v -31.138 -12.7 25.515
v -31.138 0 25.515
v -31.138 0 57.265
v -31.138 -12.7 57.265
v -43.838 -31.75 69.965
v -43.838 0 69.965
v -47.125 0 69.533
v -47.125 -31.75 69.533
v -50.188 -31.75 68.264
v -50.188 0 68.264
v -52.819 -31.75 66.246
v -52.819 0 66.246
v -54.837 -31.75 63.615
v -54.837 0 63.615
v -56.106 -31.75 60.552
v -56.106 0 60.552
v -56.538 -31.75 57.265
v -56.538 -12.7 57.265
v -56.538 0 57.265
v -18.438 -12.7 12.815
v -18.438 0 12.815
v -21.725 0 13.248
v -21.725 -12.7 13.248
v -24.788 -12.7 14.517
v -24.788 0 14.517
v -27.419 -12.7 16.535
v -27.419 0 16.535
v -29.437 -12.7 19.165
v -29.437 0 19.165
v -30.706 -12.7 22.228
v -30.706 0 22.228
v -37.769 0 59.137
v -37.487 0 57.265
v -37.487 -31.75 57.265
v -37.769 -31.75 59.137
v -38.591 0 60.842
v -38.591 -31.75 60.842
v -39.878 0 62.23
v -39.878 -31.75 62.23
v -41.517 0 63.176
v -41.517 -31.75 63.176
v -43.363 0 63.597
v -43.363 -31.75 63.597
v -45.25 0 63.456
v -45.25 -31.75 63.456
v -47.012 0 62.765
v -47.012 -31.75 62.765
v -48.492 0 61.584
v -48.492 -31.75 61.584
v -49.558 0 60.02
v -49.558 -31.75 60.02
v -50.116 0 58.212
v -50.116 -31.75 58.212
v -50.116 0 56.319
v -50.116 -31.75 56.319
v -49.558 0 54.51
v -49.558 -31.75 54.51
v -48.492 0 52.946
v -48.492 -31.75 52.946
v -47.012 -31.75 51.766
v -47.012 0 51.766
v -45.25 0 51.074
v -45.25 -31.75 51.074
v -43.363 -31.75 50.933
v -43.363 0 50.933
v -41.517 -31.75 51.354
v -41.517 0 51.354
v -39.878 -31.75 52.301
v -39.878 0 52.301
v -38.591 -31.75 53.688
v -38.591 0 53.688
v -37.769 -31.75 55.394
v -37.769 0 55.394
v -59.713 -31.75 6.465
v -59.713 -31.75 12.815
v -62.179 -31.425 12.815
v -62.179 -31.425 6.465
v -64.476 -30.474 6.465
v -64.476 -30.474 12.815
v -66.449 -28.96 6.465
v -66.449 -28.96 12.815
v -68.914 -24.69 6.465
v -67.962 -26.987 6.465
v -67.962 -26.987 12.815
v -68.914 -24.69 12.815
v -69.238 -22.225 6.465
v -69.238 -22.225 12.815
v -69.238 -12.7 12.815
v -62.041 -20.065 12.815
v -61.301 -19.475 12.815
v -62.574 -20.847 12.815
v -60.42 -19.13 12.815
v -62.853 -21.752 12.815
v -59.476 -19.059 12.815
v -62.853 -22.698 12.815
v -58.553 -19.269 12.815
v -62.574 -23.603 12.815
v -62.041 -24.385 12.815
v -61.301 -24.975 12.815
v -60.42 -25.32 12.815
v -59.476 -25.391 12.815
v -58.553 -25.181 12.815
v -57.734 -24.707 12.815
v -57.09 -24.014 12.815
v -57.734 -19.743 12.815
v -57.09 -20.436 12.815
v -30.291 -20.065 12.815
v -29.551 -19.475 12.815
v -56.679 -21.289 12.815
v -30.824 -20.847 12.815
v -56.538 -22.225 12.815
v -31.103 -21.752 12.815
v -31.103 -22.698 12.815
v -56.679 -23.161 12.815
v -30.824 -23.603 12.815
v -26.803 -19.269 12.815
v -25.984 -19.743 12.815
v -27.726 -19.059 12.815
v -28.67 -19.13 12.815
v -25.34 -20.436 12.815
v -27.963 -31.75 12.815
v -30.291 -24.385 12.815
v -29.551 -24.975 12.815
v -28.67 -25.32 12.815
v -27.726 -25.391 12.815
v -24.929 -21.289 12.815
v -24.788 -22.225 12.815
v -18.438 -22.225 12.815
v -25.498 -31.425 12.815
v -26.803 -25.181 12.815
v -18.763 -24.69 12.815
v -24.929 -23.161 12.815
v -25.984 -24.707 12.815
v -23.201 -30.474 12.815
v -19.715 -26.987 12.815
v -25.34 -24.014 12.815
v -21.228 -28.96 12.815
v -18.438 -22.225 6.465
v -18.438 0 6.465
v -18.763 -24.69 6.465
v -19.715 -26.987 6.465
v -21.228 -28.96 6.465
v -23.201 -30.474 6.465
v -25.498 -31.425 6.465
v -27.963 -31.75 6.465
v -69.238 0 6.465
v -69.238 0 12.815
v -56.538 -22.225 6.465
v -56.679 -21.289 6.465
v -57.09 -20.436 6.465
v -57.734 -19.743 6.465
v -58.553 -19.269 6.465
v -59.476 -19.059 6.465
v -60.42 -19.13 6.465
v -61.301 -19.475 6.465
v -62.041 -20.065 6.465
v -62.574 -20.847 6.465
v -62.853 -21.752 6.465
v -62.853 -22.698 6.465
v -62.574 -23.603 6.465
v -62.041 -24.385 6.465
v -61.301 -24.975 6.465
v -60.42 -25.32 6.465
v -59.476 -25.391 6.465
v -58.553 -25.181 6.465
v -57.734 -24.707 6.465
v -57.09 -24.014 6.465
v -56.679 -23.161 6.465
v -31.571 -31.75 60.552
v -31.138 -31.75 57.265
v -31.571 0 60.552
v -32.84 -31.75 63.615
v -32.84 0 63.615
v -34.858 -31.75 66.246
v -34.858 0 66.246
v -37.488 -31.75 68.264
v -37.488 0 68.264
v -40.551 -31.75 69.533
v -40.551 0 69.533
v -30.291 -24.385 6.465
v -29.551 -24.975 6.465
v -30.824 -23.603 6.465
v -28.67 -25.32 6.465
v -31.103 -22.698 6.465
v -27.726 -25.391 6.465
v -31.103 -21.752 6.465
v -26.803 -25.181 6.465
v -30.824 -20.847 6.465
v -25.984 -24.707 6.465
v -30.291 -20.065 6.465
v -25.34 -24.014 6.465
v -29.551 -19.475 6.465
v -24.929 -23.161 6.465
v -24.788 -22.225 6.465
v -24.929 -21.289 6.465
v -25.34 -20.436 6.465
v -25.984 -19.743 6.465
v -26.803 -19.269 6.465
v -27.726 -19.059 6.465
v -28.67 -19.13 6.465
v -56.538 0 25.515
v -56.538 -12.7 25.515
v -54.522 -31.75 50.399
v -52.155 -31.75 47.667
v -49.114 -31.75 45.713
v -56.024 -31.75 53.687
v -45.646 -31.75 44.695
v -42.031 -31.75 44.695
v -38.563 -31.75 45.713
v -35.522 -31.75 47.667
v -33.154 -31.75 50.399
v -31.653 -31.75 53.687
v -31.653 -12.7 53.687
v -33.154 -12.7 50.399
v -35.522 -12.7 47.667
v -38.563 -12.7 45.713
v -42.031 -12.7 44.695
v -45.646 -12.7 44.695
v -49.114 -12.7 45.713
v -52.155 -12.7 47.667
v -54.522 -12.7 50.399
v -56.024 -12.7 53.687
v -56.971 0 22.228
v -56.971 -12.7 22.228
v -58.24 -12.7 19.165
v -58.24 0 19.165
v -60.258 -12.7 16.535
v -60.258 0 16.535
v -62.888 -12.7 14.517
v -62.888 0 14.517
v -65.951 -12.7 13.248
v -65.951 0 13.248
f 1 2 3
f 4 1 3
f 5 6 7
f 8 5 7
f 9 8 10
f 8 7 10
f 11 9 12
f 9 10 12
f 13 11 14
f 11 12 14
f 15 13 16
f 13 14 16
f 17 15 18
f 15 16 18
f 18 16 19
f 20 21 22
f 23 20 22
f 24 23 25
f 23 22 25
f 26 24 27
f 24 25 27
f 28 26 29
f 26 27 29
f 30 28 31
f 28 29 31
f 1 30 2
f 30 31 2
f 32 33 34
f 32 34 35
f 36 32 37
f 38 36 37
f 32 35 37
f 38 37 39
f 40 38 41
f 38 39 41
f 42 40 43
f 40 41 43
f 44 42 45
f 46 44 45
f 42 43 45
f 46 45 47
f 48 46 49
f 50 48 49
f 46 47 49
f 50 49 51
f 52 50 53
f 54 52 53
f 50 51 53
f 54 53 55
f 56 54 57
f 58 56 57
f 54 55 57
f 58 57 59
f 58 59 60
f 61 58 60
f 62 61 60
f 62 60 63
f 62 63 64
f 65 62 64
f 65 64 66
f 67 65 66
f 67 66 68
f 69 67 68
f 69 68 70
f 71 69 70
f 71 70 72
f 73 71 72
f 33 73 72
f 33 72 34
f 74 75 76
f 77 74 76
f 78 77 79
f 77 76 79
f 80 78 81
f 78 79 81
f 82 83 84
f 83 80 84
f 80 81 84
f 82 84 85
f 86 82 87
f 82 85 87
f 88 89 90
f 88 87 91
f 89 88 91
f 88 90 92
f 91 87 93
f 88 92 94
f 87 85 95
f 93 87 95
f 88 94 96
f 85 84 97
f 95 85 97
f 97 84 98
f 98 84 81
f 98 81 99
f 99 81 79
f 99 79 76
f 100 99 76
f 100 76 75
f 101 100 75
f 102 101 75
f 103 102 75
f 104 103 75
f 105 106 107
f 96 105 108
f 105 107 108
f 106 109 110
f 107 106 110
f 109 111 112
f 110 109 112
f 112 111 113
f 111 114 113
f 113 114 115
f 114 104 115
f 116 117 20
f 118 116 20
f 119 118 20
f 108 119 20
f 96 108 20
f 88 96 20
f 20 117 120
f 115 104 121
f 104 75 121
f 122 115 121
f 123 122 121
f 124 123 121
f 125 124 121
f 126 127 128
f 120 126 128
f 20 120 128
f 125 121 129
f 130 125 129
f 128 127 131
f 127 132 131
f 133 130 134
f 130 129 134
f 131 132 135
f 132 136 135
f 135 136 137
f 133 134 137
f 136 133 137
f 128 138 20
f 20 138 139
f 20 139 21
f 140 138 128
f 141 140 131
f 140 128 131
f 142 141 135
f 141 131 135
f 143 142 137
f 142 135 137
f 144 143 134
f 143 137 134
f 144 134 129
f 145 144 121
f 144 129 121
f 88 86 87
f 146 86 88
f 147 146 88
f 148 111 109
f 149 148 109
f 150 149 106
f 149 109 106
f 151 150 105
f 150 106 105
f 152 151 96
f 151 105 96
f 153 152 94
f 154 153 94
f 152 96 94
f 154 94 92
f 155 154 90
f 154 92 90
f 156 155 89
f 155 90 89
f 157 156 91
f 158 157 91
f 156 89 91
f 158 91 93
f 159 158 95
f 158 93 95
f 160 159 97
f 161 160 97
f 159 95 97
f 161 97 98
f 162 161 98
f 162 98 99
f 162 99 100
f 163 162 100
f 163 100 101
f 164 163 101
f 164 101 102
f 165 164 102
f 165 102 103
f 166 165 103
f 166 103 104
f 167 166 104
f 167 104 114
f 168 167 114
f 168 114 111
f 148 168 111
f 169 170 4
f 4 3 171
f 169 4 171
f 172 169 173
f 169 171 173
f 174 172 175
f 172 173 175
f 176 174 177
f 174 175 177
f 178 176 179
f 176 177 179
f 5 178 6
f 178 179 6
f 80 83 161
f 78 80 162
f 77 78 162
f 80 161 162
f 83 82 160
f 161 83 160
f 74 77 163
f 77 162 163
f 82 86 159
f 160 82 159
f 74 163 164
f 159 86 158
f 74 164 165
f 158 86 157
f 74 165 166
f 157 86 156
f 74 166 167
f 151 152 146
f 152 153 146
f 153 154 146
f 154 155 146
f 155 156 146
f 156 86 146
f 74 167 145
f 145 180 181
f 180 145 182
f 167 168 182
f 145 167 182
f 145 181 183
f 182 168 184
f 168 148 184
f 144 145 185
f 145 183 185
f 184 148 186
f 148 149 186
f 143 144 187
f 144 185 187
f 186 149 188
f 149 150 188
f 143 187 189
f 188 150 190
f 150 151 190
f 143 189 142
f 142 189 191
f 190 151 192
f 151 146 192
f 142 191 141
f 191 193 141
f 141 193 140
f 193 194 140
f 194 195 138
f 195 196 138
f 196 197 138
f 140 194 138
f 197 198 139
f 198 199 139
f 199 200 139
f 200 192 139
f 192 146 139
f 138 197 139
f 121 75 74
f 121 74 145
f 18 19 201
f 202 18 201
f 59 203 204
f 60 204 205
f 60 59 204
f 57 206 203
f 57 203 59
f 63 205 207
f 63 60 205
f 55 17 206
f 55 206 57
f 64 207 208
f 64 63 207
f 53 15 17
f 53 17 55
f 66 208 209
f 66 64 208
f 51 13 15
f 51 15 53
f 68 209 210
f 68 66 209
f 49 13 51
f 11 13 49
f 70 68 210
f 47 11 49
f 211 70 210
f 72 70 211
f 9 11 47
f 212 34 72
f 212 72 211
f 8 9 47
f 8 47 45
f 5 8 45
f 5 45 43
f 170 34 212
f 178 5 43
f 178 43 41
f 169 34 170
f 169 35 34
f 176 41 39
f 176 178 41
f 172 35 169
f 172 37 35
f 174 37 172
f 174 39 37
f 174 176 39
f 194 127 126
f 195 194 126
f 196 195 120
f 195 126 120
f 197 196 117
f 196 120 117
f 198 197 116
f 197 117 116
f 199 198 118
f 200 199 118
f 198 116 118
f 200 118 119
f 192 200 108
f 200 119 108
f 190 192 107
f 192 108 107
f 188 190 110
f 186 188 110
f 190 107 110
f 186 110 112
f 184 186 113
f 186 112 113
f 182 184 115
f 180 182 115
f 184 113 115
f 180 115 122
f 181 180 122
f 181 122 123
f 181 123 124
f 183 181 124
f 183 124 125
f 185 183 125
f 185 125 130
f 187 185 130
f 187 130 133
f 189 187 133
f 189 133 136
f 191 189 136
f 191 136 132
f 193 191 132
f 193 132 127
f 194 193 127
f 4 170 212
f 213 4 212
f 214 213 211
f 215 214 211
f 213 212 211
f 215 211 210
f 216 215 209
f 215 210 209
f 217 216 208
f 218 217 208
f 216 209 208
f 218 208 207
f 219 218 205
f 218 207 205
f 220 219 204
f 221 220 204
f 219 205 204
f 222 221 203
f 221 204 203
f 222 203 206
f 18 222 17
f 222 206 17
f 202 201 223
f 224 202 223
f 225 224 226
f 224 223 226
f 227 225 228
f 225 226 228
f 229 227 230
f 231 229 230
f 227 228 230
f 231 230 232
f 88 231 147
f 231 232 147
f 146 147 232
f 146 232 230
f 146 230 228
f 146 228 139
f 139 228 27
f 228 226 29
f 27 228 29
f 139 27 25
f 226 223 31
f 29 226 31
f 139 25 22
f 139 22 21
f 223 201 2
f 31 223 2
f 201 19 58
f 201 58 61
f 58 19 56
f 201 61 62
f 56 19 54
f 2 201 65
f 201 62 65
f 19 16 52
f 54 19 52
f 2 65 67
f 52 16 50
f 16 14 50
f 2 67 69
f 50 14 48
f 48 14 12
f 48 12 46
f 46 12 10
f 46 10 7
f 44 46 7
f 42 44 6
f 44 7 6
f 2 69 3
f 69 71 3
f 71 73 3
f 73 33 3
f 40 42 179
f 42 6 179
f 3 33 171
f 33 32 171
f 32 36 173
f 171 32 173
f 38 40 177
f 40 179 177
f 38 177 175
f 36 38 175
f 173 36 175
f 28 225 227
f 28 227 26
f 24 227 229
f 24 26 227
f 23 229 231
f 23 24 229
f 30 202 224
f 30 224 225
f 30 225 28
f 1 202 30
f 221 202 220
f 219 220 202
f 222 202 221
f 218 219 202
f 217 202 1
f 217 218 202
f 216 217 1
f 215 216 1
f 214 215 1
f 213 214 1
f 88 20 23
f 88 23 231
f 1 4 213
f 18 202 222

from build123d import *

# Parameters (mm, degrees)
F0_W     = 50.8
F0_H     = 63.5
F1_DEPTH = 31.75
F3_DEPTH = 31.751
F5_DEPTH = 19.05
F6_R     = 3.175
F7_DEPTH = 25.4
F8_R     = 6.35
F9_DEPTH = 31.751


with BuildPart() as f1:
    # F0 (on Front) → F1 (new body)
    with BuildSketch(Plane.XZ):
        with Locations((-43.838402, 38.215244)):
            Rectangle(F0_W, F0_H)
    extrude(amount=F1_DEPTH)

    # F2 (on face) → F3 (cut, through all)
    with BuildSketch(Plane(origin=(0, 0, 0), x_dir=(-1, 0, 0), z_dir=(0, 1, 0))):
        with BuildLine():
            Line((18.438402, 69.965244), (18.438402, 12.815244))
            ThreePointArc((18.438402, 12.815244), (27.418658, 16.534988), (31.138402, 25.515244))
            Line((31.138402, 25.515244), (31.138402, 57.265244))
            ThreePointArc((31.138402, 57.265244), (34.858146, 66.2455), (43.838402, 69.965244))
            Line((43.838402, 69.965244), (18.438402, 69.965244))
        make_face()
        with BuildLine():
            ThreePointArc((56.538402, 25.515244), (60.258146, 16.534988), (69.238402, 12.815244))
            Line((69.238402, 12.815244), (69.238402, 69.965244))
            Line((69.238402, 69.965244), (43.838402, 69.965244))
            ThreePointArc((43.838402, 69.965244), (52.818658, 66.2455), (56.538402, 57.265244))
            Line((56.538402, 57.265244), (56.538402, 25.515244))
        make_face()
    extrude(amount=-F3_DEPTH, mode=Mode.SUBTRACT)

    # F4 (on face) → F5 (cut)
    with BuildSketch(Plane.XZ.offset(31.75)):
        with BuildLine():
            ThreePointArc((-56.538402, 25.515244), (-60.258146, 16.534988), (-69.238402, 12.815244))
            Line((-69.238402, 12.815244), (-18.438402, 12.815244))
            ThreePointArc((-18.438402, 12.815244), (-27.418658, 16.534988), (-31.138402, 25.515244))
            Line((-31.138402, 25.515244), (-31.138402, 57.265244))
            ThreePointArc((-31.138402, 57.265244), (-43.838402, 44.565244), (-56.538402, 57.265244))
            Line((-56.538402, 57.265244), (-56.538402, 25.515244))
        make_face()
    extrude(amount=-F5_DEPTH, mode=Mode.SUBTRACT)

    # F6 (on face) → F7 (cut)
    with BuildSketch(Plane.XY.offset(12.815244)):
        with Locations((-27.963402, -22.225)):
            Circle(F6_R)
        with Locations((-59.713402, -22.225)):
            Circle(F6_R)
        with BuildLine():
            Line((-69.238402, -31.75), (-59.713402, -31.75))
            ThreePointArc((-59.713402, -31.75), (-66.448594, -28.960192), (-69.238402, -22.225))
            Line((-69.238402, -22.225), (-69.238402, -31.75))
        make_face()
        with BuildLine():
            ThreePointArc((-18.438402, -22.225), (-21.22821, -28.960192), (-27.963402, -31.75))
            Line((-27.963402, -31.75), (-18.438402, -31.75))
            Line((-18.438402, -31.75), (-18.438402, -22.225))
        make_face()
    extrude(amount=-F7_DEPTH, mode=Mode.SUBTRACT)

    # F8 (on face) → F9 (cut, through all)
    with BuildSketch(Plane.XZ.offset(31.75)):
        with Locations((-43.83729, 57.265244)):
            Circle(F8_R)
    extrude(amount=-F9_DEPTH, mode=Mode.SUBTRACT)


solid = f1.part
